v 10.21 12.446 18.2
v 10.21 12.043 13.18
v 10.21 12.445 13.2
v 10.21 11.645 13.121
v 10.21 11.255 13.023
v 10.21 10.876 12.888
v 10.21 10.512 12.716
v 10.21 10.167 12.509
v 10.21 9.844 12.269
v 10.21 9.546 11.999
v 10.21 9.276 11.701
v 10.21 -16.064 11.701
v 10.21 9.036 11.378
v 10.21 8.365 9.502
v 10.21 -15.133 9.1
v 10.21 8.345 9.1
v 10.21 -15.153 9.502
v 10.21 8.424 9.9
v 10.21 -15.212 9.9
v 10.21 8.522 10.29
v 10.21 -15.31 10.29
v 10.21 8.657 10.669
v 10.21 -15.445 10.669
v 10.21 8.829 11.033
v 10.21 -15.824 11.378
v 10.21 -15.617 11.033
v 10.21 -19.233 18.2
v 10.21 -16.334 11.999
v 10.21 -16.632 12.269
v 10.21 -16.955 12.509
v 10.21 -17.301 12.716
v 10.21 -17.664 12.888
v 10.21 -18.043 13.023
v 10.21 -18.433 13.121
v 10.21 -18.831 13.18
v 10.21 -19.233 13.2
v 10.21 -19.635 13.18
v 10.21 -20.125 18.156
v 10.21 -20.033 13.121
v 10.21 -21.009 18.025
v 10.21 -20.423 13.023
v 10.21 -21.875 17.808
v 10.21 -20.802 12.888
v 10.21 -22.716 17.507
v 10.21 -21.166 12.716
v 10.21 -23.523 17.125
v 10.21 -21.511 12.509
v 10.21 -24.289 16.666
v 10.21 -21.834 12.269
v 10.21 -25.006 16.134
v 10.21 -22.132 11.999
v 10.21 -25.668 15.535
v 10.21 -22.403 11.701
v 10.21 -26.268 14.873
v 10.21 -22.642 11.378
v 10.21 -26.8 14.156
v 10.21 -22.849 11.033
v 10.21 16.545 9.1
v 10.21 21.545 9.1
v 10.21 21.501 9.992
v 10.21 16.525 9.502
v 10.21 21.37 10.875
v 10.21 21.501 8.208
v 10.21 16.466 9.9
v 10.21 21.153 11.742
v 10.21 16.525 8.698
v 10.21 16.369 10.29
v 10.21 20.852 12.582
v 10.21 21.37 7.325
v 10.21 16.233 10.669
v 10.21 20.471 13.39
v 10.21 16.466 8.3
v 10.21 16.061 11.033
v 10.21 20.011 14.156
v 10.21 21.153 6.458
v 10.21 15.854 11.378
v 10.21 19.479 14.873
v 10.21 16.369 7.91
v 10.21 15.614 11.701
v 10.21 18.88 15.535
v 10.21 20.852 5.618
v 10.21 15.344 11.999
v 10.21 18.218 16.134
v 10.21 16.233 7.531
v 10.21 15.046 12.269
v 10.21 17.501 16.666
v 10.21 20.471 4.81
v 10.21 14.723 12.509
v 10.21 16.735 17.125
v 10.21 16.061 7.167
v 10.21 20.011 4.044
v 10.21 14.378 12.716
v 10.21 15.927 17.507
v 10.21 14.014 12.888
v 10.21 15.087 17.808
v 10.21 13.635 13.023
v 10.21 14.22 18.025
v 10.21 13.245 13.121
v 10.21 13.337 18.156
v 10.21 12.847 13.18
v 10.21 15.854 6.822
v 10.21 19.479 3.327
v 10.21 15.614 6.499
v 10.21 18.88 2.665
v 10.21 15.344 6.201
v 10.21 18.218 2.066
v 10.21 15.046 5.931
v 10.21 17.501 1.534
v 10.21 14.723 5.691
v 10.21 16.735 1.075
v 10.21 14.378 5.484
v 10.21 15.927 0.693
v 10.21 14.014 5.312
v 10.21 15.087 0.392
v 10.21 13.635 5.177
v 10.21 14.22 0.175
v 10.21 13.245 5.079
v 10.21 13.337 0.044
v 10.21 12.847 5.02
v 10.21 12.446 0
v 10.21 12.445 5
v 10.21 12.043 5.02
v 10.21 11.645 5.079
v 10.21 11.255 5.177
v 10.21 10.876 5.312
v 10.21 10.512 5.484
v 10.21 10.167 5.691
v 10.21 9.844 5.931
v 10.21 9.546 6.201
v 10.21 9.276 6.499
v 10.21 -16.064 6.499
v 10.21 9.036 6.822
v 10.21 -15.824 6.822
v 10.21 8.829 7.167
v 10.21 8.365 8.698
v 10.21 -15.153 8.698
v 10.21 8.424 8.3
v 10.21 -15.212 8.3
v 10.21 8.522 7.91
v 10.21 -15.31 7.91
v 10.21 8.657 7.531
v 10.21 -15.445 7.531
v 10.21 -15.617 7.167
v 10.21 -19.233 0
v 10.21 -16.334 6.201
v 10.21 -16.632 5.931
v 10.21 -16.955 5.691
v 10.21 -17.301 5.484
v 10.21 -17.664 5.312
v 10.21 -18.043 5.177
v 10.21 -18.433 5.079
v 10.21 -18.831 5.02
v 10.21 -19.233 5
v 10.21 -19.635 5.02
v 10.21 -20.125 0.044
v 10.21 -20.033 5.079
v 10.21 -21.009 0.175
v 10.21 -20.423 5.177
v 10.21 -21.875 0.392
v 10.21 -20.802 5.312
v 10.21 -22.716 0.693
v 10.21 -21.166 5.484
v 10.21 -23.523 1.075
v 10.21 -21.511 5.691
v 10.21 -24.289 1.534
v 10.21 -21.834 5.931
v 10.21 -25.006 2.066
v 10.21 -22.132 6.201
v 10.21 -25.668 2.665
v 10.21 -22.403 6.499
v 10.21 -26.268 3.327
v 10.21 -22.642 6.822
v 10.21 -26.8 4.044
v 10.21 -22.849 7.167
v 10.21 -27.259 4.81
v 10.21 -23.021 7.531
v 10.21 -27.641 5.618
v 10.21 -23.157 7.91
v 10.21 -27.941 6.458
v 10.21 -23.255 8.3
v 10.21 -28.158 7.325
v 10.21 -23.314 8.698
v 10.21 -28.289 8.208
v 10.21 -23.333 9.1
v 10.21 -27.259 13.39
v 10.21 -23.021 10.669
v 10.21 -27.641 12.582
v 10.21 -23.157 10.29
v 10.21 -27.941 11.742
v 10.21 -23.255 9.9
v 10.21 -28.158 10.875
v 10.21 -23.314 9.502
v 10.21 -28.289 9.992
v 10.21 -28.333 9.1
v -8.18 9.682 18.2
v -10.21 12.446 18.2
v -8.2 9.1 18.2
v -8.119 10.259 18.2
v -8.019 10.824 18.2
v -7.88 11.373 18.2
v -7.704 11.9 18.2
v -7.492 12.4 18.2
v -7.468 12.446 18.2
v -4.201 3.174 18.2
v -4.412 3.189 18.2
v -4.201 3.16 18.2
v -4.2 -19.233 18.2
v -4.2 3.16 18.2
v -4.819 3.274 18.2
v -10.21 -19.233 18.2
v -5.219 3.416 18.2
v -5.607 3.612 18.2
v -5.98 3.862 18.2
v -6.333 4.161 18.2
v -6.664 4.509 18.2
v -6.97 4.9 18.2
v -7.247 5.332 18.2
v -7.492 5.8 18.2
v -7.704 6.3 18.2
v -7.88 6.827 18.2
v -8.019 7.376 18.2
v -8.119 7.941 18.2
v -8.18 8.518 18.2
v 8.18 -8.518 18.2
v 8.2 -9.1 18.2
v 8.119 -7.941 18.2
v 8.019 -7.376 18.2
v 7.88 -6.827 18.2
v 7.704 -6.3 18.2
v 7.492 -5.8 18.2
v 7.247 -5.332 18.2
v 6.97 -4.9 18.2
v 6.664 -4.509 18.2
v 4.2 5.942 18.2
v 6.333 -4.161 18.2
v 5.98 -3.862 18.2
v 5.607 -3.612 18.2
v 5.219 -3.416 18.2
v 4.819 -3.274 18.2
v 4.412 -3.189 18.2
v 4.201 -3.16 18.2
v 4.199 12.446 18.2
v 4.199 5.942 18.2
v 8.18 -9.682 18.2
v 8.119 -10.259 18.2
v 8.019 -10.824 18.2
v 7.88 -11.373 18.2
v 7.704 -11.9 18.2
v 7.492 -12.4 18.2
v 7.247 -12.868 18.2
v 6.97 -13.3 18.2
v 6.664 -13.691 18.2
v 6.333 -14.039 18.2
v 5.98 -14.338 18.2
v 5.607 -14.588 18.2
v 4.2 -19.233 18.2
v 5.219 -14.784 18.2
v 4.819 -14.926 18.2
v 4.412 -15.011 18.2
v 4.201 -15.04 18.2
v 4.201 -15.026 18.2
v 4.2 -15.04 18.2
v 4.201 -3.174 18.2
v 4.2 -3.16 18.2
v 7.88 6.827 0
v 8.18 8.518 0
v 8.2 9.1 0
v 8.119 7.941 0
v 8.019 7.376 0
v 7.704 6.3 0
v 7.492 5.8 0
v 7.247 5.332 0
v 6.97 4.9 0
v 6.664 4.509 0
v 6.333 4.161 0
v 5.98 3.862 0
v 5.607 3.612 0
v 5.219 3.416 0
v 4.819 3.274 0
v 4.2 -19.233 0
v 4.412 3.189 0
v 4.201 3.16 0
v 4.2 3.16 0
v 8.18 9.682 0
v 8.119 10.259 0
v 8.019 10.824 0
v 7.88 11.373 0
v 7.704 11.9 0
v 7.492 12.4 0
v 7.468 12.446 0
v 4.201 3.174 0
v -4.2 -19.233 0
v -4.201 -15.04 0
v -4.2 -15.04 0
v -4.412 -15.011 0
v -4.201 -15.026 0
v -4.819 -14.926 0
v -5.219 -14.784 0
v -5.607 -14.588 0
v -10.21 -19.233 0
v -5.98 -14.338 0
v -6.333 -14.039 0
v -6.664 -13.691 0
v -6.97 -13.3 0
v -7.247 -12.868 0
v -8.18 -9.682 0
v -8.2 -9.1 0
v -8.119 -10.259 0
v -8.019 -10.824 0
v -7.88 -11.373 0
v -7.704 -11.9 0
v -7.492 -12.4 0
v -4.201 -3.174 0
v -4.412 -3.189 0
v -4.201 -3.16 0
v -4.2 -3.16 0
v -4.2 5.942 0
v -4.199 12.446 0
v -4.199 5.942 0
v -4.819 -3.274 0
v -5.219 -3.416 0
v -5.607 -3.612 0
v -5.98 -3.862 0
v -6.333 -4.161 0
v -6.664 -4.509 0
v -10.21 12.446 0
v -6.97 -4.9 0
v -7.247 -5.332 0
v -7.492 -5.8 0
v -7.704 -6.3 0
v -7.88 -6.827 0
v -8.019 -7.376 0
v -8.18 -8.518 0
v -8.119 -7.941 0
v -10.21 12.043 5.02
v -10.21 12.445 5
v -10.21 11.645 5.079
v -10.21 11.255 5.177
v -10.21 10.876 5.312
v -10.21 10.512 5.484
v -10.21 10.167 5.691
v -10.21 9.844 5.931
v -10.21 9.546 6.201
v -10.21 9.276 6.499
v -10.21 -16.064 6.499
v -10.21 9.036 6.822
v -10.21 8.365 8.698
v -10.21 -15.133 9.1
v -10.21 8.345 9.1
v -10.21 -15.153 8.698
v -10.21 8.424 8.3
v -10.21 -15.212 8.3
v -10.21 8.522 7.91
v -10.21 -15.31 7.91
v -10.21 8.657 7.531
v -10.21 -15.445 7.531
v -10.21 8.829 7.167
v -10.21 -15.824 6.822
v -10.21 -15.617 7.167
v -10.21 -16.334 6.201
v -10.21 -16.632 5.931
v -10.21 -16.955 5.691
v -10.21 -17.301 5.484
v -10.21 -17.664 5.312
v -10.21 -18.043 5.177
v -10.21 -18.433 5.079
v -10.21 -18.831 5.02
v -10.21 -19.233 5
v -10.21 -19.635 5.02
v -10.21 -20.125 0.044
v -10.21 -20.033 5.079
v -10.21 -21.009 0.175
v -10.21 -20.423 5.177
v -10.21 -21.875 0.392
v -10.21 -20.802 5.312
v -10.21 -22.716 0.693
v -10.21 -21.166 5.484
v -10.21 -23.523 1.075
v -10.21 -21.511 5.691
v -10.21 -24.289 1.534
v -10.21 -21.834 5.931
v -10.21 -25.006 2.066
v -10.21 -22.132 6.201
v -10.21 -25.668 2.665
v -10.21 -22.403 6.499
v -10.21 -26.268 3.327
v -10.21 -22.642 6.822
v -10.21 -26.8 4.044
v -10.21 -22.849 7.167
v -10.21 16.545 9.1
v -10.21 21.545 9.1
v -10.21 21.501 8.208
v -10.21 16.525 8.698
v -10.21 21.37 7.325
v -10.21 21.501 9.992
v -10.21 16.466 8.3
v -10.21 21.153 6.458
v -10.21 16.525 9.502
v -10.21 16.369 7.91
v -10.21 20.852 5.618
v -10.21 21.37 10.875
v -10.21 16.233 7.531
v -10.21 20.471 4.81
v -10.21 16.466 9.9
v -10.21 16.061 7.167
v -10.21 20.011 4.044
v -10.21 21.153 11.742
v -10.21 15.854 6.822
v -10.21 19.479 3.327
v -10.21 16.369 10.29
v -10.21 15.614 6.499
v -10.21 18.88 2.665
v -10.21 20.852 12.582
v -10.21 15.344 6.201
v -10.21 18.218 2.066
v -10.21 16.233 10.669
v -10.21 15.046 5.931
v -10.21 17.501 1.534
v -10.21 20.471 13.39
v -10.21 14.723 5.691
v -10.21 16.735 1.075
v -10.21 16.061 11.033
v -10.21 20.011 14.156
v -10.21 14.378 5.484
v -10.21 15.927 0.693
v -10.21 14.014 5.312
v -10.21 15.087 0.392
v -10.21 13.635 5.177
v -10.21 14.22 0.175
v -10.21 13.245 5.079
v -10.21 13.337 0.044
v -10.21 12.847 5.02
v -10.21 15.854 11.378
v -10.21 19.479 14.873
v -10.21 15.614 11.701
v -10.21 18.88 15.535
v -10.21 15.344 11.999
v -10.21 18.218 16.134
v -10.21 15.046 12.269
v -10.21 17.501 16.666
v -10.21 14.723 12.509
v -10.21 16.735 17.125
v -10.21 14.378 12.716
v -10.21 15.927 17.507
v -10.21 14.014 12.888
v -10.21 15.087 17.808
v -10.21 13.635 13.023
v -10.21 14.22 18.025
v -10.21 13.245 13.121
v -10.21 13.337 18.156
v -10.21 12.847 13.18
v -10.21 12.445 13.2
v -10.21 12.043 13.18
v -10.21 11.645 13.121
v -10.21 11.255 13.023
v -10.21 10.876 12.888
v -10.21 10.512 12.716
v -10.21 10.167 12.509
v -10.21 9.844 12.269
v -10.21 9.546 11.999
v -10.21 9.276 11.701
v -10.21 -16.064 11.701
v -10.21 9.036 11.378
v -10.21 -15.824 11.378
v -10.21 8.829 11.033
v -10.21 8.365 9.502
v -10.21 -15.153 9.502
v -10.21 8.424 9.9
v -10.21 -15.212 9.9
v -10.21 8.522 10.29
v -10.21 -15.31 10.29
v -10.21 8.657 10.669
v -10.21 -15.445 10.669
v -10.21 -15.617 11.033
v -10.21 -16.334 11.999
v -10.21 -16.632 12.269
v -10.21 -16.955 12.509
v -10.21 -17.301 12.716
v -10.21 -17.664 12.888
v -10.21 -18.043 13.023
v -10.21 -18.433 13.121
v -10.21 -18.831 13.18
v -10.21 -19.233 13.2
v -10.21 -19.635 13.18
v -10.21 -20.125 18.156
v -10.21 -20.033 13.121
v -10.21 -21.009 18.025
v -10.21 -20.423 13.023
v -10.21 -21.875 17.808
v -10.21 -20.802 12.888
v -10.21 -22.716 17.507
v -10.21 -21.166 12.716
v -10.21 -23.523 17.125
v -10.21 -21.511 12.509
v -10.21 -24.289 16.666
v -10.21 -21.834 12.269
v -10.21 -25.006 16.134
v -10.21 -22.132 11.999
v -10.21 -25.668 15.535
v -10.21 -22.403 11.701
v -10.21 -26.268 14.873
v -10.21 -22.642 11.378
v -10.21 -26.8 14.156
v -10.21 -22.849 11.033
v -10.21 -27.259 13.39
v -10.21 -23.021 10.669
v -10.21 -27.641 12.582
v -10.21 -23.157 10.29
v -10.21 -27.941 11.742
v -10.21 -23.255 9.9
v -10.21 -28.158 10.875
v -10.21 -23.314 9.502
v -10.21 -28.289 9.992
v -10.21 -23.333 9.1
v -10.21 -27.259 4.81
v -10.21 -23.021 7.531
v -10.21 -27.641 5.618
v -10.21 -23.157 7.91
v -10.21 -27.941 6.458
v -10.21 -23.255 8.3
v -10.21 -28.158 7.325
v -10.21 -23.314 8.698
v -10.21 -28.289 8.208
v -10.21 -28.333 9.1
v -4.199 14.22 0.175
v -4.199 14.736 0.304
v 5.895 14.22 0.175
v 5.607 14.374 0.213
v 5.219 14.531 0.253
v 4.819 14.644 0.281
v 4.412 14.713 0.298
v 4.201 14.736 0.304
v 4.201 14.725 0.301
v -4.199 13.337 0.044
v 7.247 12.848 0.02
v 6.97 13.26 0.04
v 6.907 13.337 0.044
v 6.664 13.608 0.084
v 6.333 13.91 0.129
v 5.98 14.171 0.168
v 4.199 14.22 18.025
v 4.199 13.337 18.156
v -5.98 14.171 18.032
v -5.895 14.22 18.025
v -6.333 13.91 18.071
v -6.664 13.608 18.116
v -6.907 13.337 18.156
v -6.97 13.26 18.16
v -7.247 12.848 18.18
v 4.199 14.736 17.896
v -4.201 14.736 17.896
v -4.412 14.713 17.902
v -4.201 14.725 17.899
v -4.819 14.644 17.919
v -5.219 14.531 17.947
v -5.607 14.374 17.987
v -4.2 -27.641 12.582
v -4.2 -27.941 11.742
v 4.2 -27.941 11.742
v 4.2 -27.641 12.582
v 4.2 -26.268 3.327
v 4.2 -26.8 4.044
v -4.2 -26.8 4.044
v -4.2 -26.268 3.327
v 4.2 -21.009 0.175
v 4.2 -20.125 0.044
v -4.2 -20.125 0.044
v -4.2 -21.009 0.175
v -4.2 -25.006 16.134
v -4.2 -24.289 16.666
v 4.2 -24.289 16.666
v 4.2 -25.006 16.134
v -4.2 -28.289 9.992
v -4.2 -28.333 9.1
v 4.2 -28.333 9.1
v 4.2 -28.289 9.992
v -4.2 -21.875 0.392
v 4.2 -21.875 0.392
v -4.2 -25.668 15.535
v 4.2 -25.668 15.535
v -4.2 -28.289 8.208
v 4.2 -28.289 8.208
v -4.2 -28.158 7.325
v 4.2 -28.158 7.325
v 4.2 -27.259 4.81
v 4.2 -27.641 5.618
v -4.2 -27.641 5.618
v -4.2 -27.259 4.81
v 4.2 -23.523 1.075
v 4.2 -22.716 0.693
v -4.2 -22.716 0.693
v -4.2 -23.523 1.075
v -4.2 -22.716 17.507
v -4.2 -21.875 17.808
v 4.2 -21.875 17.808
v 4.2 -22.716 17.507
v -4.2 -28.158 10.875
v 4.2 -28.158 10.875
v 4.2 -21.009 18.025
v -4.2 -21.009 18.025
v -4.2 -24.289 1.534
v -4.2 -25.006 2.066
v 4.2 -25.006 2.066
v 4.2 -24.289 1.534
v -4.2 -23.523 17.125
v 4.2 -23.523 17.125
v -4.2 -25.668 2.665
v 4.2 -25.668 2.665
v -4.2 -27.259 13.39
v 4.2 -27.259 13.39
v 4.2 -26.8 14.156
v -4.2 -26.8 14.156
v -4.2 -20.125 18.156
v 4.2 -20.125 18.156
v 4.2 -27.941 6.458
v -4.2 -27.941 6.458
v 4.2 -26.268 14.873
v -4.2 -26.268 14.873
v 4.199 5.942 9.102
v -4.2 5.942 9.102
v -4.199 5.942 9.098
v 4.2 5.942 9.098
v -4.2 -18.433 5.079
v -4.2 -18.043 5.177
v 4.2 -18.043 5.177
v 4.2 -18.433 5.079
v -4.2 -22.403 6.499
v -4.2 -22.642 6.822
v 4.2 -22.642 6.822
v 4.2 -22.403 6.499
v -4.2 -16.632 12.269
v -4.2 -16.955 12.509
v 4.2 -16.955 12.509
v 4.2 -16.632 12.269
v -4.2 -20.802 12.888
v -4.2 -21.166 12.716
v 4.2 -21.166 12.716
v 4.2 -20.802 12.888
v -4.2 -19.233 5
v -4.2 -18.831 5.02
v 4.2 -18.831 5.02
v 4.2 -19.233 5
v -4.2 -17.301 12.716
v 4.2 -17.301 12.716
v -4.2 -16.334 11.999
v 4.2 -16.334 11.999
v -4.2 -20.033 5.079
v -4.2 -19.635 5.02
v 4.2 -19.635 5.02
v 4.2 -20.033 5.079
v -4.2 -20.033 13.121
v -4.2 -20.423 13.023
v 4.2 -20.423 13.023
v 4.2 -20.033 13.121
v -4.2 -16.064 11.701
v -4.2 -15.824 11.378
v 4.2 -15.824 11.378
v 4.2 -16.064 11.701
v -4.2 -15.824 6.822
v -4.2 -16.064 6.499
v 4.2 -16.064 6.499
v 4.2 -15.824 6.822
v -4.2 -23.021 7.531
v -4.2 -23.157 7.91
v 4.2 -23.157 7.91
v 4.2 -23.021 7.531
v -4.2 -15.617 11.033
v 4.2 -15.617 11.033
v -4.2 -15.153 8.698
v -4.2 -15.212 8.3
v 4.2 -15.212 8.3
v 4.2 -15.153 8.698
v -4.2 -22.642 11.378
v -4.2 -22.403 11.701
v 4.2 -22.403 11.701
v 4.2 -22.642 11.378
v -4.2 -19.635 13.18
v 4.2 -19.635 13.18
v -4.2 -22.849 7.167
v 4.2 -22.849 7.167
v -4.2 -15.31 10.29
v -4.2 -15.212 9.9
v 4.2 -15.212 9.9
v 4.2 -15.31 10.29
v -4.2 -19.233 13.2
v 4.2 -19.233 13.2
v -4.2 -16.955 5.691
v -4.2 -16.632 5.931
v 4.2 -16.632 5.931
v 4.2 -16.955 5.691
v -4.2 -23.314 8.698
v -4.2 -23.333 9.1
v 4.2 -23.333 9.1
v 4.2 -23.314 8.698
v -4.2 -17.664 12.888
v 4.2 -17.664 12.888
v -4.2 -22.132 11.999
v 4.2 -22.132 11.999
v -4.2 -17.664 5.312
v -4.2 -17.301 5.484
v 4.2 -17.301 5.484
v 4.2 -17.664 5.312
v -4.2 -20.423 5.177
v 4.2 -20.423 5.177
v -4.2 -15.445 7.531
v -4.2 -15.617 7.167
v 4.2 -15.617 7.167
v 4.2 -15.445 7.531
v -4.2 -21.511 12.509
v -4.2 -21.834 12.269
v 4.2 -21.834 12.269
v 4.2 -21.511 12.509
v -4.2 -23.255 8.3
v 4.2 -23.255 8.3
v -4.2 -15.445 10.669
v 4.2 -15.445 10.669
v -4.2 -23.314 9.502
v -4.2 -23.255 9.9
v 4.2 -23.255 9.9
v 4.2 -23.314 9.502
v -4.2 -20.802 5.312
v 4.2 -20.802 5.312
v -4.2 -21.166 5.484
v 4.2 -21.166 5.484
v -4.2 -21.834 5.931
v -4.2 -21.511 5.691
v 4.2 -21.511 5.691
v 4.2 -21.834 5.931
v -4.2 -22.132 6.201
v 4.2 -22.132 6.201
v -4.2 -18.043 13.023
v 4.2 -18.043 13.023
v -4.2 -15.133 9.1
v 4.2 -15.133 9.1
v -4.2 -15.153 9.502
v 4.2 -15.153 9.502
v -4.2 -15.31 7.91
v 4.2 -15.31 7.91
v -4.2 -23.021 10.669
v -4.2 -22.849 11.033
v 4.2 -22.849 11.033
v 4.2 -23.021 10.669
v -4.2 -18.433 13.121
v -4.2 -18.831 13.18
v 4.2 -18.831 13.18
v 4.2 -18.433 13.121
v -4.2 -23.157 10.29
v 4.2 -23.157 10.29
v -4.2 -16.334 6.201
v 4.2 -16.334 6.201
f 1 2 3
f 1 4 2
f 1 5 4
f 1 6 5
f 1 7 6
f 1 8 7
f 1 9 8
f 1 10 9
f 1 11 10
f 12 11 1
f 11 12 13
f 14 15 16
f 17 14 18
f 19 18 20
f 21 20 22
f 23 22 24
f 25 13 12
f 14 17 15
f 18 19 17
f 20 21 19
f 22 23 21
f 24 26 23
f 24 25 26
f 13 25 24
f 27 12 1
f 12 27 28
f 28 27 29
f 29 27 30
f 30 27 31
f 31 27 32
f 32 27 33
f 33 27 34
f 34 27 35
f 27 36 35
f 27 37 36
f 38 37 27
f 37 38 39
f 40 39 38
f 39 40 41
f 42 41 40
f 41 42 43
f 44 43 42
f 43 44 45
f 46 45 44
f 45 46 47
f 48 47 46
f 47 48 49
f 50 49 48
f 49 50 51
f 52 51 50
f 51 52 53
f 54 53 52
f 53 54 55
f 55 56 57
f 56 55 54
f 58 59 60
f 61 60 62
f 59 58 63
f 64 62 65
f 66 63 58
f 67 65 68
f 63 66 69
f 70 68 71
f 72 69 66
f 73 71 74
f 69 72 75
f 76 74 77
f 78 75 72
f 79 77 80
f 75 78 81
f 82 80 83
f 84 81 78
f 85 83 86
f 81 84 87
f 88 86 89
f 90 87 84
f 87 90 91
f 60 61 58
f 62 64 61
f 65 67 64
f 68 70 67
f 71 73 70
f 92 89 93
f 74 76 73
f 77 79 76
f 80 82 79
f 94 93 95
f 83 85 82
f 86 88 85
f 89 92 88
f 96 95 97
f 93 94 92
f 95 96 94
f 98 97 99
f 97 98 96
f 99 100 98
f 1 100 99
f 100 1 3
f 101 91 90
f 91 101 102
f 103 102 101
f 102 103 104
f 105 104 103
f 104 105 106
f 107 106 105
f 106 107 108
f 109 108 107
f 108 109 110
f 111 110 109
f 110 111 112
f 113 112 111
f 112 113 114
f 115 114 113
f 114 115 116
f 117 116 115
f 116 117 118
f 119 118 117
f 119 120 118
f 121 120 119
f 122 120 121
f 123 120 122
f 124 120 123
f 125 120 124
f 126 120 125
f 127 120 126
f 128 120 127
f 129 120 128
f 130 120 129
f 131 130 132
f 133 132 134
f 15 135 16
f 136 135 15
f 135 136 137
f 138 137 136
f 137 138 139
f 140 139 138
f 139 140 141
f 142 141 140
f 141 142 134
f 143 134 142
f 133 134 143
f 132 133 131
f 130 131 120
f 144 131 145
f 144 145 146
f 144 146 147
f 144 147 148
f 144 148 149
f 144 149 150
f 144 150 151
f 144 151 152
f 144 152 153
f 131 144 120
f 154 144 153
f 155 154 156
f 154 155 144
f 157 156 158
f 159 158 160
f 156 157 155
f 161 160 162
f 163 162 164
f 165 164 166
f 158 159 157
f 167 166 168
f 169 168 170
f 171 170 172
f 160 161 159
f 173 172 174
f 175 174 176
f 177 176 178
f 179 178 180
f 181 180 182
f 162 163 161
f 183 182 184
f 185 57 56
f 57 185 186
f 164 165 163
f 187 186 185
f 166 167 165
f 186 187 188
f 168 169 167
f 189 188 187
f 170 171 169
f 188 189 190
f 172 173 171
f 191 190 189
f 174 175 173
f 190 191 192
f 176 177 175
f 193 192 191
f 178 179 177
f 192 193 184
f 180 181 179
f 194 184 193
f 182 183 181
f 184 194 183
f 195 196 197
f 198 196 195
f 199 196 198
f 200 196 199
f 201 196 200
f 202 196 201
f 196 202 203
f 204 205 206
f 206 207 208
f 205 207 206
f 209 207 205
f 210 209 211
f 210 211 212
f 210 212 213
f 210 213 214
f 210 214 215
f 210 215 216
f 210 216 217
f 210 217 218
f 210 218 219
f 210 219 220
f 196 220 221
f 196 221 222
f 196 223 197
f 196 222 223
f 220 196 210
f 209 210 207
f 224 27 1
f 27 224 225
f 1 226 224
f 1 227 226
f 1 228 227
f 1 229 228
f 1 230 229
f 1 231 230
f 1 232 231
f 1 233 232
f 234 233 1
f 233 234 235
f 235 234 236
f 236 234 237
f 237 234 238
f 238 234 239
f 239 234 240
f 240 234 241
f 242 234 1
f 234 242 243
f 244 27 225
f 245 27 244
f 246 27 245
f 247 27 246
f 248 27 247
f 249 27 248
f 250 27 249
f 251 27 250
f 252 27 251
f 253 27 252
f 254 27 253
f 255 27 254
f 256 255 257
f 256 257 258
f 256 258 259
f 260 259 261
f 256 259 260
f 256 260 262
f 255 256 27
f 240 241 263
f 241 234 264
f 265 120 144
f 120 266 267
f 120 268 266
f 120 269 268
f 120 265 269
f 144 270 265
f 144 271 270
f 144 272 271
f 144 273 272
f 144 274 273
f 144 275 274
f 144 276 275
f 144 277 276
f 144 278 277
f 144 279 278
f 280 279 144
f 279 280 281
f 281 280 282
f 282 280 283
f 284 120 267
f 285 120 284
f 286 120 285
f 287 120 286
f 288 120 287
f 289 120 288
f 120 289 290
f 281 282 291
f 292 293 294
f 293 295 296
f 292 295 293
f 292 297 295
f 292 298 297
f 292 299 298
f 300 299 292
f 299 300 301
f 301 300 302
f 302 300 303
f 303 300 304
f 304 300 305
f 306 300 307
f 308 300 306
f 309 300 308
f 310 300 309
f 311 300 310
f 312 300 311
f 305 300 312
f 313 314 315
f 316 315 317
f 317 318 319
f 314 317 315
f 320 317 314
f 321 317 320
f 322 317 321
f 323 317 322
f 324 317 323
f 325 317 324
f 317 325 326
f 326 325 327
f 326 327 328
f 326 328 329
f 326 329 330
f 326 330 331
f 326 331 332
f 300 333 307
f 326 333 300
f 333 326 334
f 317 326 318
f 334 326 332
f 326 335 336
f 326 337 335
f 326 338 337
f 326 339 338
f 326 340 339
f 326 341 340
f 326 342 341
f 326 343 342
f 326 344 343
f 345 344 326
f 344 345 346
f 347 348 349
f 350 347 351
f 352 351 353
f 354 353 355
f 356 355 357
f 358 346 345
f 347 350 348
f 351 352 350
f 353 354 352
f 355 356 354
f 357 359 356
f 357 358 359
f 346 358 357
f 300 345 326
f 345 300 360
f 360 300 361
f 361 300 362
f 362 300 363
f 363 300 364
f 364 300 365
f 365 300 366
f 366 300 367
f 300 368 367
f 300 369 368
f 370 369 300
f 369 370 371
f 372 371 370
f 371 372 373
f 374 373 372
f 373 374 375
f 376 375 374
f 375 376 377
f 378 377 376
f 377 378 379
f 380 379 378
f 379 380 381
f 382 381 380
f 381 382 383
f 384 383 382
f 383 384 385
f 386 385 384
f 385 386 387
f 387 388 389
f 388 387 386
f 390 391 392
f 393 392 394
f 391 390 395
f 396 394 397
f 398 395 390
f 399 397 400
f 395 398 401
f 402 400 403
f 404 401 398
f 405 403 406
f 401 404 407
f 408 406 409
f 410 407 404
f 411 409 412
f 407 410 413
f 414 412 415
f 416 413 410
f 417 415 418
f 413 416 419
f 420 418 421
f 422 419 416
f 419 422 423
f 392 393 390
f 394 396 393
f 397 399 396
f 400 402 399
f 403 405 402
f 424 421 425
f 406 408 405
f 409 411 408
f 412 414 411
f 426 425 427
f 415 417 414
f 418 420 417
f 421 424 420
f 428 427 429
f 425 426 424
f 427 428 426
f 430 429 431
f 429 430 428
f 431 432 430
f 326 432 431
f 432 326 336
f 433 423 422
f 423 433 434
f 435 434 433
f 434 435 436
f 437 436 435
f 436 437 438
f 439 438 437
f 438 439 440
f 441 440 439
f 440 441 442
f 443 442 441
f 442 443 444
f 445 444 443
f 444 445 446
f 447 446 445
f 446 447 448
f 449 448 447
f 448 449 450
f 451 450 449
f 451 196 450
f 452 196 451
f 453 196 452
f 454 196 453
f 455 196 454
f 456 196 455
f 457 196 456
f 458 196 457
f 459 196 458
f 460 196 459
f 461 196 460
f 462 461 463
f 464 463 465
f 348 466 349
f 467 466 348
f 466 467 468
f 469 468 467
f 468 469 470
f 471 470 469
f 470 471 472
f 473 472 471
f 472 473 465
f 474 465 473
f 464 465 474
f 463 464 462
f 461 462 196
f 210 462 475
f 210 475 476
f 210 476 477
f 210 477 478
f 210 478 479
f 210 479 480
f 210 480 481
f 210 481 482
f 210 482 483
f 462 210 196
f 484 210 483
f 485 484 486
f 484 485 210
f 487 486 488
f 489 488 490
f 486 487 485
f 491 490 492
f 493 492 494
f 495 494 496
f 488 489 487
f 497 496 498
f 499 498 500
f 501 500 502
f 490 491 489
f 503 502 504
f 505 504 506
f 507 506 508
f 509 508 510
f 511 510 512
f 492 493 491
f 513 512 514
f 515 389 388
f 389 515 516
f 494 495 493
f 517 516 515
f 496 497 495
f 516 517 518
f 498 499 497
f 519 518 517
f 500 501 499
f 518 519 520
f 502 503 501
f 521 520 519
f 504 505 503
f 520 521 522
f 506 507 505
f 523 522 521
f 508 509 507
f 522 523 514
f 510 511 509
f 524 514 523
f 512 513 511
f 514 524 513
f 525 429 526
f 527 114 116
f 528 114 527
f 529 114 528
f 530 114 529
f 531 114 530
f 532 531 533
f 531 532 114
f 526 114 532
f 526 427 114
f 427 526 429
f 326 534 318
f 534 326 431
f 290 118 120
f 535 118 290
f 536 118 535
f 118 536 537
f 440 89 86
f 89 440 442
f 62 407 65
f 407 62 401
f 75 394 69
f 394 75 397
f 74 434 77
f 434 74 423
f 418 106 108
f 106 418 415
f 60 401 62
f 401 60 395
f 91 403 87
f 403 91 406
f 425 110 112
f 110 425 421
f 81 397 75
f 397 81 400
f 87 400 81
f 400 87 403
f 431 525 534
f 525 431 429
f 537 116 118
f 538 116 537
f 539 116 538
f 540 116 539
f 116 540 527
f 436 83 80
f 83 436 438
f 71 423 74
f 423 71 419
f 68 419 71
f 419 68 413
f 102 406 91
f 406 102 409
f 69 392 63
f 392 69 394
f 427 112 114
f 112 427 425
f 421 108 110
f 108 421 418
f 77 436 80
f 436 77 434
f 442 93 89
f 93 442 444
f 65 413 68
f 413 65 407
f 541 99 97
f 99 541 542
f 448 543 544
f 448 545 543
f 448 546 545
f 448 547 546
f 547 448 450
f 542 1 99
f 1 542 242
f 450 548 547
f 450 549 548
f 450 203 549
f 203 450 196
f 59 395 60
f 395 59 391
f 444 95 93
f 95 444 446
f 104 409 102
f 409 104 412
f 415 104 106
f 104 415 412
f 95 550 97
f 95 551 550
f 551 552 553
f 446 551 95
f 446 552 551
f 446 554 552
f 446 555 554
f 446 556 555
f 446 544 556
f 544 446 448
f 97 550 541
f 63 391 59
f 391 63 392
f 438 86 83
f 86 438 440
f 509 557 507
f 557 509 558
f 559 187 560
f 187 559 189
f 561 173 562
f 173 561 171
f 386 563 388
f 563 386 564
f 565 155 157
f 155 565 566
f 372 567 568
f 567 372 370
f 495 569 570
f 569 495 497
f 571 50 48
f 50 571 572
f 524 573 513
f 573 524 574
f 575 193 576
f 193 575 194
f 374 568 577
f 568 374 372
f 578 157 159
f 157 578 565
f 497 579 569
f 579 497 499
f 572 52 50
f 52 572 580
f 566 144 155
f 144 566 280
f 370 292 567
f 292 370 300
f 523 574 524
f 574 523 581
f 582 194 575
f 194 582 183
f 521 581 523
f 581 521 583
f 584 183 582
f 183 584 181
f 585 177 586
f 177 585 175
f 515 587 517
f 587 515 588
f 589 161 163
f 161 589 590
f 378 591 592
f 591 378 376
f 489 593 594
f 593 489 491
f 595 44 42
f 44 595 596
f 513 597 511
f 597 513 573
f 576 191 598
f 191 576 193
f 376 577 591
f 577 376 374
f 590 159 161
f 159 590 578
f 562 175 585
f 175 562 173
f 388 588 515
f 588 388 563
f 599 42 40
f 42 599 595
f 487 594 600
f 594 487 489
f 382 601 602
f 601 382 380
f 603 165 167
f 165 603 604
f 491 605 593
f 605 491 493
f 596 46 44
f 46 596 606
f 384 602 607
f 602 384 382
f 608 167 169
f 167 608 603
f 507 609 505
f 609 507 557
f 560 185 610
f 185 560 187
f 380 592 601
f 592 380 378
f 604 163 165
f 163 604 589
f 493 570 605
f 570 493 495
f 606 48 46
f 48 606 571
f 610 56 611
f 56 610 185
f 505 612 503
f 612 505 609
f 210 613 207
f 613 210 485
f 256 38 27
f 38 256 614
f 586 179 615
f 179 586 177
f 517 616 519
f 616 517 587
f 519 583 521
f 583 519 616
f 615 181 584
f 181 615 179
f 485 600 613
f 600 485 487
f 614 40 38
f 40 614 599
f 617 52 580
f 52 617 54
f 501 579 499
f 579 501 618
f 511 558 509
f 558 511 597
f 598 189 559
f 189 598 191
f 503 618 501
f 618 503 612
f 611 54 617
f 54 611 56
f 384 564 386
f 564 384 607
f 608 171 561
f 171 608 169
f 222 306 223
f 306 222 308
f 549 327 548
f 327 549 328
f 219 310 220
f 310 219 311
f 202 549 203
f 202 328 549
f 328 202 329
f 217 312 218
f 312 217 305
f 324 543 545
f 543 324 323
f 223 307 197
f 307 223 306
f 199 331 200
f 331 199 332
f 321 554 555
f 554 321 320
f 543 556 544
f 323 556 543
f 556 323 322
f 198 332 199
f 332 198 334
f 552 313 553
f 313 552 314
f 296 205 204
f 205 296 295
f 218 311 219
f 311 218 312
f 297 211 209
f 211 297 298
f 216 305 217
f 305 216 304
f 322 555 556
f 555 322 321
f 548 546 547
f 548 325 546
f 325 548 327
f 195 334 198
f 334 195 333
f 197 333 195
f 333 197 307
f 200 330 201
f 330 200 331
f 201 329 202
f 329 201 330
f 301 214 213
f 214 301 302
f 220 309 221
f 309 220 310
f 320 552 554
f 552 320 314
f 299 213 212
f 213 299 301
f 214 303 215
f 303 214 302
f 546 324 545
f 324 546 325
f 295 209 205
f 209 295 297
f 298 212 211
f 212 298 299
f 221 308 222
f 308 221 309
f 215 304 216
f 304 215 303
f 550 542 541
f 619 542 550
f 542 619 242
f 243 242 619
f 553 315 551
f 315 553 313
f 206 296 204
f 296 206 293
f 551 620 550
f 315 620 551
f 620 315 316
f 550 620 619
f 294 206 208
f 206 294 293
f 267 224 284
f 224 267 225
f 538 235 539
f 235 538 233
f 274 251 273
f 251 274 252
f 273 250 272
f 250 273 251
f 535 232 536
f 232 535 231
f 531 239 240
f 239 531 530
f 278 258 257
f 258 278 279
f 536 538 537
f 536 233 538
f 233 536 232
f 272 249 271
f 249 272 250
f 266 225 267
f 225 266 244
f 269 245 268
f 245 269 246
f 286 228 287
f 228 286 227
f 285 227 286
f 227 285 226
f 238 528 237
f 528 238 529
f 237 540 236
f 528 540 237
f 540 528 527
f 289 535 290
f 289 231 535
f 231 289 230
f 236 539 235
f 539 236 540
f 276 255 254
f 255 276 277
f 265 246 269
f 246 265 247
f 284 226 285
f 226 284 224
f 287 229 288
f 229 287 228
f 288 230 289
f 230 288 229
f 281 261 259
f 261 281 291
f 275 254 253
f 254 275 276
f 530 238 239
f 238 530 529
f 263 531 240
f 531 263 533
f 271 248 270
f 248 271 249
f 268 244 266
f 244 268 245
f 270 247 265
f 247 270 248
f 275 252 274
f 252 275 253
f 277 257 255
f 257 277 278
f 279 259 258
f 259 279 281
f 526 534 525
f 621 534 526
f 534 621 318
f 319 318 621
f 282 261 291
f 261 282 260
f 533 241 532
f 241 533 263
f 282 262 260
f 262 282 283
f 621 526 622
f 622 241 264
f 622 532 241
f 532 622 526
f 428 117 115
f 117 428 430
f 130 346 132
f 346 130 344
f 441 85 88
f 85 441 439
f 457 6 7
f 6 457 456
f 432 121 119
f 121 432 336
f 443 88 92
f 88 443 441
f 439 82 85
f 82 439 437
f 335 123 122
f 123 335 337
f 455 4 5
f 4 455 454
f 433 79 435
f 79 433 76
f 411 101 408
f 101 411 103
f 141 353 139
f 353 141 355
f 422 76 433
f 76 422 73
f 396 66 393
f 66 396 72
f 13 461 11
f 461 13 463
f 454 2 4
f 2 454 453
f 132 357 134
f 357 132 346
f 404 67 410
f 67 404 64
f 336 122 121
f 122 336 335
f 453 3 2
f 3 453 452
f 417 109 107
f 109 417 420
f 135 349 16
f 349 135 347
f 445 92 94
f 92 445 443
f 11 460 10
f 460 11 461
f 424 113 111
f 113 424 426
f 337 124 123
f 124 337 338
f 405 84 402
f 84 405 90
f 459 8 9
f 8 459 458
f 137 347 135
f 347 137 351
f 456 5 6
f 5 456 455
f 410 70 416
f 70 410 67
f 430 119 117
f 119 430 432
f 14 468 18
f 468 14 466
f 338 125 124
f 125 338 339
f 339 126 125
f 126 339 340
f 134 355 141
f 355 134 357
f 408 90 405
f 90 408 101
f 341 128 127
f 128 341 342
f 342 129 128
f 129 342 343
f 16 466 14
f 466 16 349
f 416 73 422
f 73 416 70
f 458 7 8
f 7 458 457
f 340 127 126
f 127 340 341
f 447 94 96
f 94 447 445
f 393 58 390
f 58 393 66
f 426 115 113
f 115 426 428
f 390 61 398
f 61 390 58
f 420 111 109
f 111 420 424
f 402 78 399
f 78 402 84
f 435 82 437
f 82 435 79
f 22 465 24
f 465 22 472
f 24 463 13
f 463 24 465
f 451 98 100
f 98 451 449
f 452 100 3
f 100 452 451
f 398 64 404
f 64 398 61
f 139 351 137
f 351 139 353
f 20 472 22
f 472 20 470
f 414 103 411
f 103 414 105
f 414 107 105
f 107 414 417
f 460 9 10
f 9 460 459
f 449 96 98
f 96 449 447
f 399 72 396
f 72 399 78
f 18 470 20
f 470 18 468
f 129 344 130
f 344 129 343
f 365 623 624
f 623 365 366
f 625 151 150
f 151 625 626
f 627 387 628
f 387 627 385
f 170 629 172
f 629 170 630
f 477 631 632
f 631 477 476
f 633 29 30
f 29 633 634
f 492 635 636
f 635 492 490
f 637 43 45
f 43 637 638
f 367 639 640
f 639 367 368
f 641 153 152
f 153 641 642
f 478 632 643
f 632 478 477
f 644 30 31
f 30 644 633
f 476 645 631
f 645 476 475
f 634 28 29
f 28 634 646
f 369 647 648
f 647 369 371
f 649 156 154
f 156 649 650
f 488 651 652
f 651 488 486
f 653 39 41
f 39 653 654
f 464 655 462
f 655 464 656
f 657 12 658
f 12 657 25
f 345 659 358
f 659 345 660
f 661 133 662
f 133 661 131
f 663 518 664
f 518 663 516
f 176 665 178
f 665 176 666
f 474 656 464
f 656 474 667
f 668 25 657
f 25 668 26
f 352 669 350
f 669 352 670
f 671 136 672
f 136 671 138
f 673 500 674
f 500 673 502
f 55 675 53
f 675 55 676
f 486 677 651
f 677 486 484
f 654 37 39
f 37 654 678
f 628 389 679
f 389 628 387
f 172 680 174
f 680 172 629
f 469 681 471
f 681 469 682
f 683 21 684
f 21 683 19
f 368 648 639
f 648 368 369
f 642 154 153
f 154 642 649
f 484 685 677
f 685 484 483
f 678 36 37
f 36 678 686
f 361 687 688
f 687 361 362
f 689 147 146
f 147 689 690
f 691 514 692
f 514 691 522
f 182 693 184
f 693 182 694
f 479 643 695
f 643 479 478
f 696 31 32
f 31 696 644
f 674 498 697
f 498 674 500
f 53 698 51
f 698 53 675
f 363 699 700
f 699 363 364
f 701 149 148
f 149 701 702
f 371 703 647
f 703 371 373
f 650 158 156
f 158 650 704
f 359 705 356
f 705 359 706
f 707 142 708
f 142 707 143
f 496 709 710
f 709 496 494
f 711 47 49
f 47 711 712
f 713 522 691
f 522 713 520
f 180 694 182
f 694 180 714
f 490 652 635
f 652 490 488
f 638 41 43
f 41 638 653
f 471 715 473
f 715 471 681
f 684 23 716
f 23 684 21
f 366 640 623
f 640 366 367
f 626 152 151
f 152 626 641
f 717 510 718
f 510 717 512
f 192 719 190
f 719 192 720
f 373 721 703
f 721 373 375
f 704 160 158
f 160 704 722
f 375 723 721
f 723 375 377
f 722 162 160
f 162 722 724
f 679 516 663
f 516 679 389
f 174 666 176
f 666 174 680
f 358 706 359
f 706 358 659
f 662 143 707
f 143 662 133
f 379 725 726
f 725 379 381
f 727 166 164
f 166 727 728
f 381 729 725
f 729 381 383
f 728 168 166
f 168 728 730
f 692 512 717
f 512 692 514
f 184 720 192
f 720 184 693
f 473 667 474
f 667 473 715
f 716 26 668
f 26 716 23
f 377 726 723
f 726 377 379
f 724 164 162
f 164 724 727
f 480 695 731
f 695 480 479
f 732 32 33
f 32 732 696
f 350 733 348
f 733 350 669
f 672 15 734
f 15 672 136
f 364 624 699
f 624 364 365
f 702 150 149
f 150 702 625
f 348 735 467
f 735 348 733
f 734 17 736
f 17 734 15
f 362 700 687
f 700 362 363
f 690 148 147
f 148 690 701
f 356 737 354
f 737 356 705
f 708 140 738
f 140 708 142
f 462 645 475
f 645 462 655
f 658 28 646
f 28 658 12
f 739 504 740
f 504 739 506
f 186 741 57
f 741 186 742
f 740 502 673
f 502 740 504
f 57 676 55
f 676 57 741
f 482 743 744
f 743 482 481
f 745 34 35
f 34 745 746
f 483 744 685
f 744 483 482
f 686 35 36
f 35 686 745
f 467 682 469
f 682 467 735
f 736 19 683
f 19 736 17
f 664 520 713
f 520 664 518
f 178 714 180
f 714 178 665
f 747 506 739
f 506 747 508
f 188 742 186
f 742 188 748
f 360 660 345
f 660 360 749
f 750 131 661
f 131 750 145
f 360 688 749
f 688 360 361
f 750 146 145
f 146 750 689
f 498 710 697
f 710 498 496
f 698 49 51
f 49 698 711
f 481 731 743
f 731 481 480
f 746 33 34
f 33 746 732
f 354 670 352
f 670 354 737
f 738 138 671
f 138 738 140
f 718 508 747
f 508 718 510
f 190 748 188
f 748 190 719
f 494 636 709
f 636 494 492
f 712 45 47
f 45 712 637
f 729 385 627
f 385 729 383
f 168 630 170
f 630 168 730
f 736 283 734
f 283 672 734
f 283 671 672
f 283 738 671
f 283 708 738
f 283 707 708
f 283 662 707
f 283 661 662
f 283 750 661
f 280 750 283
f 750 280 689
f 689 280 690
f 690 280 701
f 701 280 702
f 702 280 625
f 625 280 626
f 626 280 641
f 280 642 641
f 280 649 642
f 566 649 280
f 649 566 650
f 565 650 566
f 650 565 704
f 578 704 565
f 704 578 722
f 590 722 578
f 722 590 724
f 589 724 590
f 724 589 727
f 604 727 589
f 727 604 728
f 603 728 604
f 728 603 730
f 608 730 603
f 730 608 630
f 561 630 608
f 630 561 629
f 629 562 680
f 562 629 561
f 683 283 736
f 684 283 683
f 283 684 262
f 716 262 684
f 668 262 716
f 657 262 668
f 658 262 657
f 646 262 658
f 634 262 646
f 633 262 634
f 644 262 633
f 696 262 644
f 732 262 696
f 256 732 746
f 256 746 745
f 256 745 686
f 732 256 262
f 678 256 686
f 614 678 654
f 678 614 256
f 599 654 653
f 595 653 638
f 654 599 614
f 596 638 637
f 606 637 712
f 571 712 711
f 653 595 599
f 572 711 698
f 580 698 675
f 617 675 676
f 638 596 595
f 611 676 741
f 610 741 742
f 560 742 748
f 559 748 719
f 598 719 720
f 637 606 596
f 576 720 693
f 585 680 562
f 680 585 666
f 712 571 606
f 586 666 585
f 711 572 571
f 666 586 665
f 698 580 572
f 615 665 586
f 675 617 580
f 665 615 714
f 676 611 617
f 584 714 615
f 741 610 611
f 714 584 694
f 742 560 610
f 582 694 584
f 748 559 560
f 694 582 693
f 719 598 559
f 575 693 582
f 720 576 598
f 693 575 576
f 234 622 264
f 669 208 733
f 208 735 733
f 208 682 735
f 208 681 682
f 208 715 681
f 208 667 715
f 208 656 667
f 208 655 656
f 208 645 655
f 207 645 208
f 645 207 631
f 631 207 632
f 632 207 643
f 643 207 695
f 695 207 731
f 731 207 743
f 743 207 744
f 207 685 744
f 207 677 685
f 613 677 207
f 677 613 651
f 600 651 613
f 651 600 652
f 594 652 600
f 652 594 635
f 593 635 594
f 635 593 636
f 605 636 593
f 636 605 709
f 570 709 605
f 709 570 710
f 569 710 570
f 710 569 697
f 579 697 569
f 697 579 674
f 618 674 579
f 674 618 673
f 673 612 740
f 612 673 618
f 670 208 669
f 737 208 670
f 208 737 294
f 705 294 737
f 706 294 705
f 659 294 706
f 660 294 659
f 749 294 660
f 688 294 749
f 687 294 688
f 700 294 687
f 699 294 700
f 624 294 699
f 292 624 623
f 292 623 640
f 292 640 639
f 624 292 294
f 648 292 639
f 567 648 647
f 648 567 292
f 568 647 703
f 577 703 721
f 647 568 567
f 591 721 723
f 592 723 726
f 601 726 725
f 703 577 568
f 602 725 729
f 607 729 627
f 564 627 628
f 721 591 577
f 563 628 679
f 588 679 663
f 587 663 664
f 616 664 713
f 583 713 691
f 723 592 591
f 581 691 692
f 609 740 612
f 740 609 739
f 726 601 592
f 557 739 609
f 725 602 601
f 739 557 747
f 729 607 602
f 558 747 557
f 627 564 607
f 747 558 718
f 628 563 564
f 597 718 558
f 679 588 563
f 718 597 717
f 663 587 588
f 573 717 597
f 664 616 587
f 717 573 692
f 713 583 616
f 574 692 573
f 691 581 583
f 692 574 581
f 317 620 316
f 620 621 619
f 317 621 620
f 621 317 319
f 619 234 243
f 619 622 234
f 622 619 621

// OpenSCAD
// file: configuration.scad
/*
 * Igor Soares' parallel kinematic XY
 * Configuration
 * (C) 2014 by Ígor Bruno Pereira Soares
 *
 * This project is free: you can redistribute it and/or modify
 * it under the terms of the GNU General Public License as published by
 * the Free Software Foundation, either version 2 of the License, or
 * (at your option) any later version.
 *
 * This project is distributed in the hope that it will be useful,
 * but WITHOUT ANY WARRANTY; without even the implied warranty of
 * MERCHANTABILITY or FITNESS FOR A PARTICULAR PURPOSE.  See the
 * GNU General Public License for more details.
 *
 * You should have received a copy of the GNU General Public License
 * along with this project.  If not, see <http://www.gnu.org/licenses/>.
 */

LIGHT_WALL_WIDTH = 2.01;
WALL_WIDTH = 5.0;
VERTICAL_SUPPORT_WALL = 0.5;
HORIZONTAL_SUPPORT_WALL = 0.255;

BEARING_DIAMETER = 22.4;
BEARING_WIDTH = 7;
BEARING_SCREW_DIAMETER = 8.2;
BEARING_SCREW_NUT_WIDTH = 13;

INNER_BEARING_SCREW_DISTANCE_TO_ROD = VERTICAL_SUPPORT_WALL;
INNER_BEARING_POS = 15;

SPACING_TO_BEARING = 18.0;
ROD_ACTUAL_DIAMETER = 8.0;
ROD_HOLE_DIAMETER = 8.4;

ROD_CLAMP_SCREW_DIAMETER = 3.6;
ROD_CLAMP_SCREW_NUT_WIDTH = 6.7;
ROD_CLAMP_SCREW_NUT_H = 3.5;
ROD_CLAMP_GAP = 1.0;

MOTOR_SCREW_DIAMETER = 3.4;
MOTOR_SCREW_MOUNT = 31; // nema 17
MOTOR_SIZE = 43;
MOTOR_MOUNT_INNER_DIAMETER = 30;
MOTOR_BELT_CLEARANCE = 5;

MOTOR_SUPPORT_SCREW_DIAMETER = 4.8 + 0.3; // 3/16 + tolerance
MOTOR_SUPPORT_SCREWS_DISTANCE = 40;

BEARING_GUIDE_H = 7;
BEARING_GUIDE_ANGLE = 30;

ST = 0.001;
// main file
/*
 * Igor Soares' parallel kinematic XY
 * Smooth rods clamp
 * (C) 2014 by Ígor Bruno Pereira Soares
 *
 * This project is free: you can redistribute it and/or modify
 * it under the terms of the GNU General Public License as published by
 * the Free Software Foundation, either version 2 of the License, or
 * (at your option) any later version.
 *
 * This project is distributed in the hope that it will be useful,
 * but WITHOUT ANY WARRANTY; without even the implied warranty of
 * MERCHANTABILITY or FITNESS FOR A PARTICULAR PURPOSE.  See the
 * GNU General Public License for more details.
 *
 * You should have received a copy of the GNU General Public License
 * along with this project.  If not, see <http://www.gnu.org/licenses/>.
 */

include <configuration.scad>

//mirror([1,0,0])
smooth_rods_clamp($fn=64);

module smooth_rods_clamp(
    lwall=LIGHT_WALL_WIDTH,
    wall=WALL_WIDTH,
    bearing_r=BEARING_DIAMETER/2,
    bearing_screw_r=BEARING_SCREW_DIAMETER/2,
    bearing_screw_rod_d=INNER_BEARING_SCREW_DISTANCE_TO_ROD,
    bearing_r=BEARING_DIAMETER/2,
    rod_r=ROD_ACTUAL_DIAMETER/2,
    rod_hole_r=ROD_HOLE_DIAMETER/2)
{
  inner_pos = (rod_hole_r + bearing_screw_rod_d + bearing_screw_r)/cos(45);
  second_pos = -(2*bearing_r)/cos(45) + inner_pos;
  central_hole_start = rod_hole_r/cos(45) + ST;

  w = 2*wall + 2*bearing_screw_r;
  h = 2*lwall + 2*rod_r + 2*rod_hole_r;

  translate([0,0,w/2])  difference() {
    union() {
      translate([-h/2,0,-w/2])
        cube([h, inner_pos + ST, w]);
      translate([-h/2,second_pos,-w/2])
        cube([h, -second_pos + ST, w]);

      translate([0, inner_pos, 0])
        rotate([0,90,0])
          cylinder(r=w/2, h=h, center=true);
      translate([0, second_pos, 0])
        rotate([0,90,0])
          cylinder(r=w/2, h=h, center=true);
    }
    //inner bearing screw
    translate([0, inner_pos, 0])
      rotate([0,90,0])
        #cylinder(r=bearing_screw_r, h=h+1, center=true);

    //outer bearing screw
    translate([0, second_pos, 0])
      rotate([0,90,0])
        #cylinder(r=bearing_screw_r, h=h+1, center=true);

    //smooth rod holes
    for (i=[-1, 1]) {
      translate([i*rod_r, 0, 0])
        rotate([i*45,0,0])
          #cylinder(r=rod_hole_r, h=(w + 2*rod_hole_r +1)/cos(45), center=true);
      translate([i*ST, 0, 0])
        rotate([i*45,0,0])
          #cube([2*rod_hole_r, 2*rod_hole_r, (w + 2*rod_hole_r +1)/cos(45)],
                center=true);
    }

    //centerl hole
    translate([-rod_hole_r,second_pos - w/2 -1,-w/2 -1])
      #cube([2*rod_hole_r,
             -second_pos + w/2 + central_hole_start +1 +ST,
             w +2]);

  }
}
